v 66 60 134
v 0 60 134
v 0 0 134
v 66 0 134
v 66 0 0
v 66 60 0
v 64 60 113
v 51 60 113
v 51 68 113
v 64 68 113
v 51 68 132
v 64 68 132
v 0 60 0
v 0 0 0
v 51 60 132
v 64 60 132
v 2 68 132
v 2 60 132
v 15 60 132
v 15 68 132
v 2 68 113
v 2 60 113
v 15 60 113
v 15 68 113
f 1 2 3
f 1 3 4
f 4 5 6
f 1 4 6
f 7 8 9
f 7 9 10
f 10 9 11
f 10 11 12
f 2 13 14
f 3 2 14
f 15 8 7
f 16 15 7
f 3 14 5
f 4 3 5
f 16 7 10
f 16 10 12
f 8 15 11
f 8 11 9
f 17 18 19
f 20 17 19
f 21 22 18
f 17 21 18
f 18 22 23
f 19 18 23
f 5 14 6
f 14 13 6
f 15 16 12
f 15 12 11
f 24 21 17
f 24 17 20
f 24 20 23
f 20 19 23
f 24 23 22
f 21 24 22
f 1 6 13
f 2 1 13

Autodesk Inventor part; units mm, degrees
ref_plane "YZ Plane" through (0, 0, 0) normal (1, 0, 0) x (0, 1, 0)
ref_plane "XZ Plane" through (0, 0, 0) normal (0, 1, 0) x (-1, 0, 0)
ref_plane "XY Plane" through (0, 0, 0) normal (0, 0, 1) x (1, 0, 0)
sketch "Sketch1" plane through (0, 0, 0) normal (0, 0, 1) x (1, 0, 0)
  line L0 (0, 0) -> (66, 0)
  line L1 (66, 0) -> (66, 60)
  line L2 (66, 60) -> (0, 60)
  line L3 (0, 60) -> (0, 0)
  dimension "BatteryHeight" = 60
  dimension "BatteryWidth" = 66
extrude "Extrusion1" add sketch "Sketch1" along normal blind 134
sketch "Sketch2" plane through (0, 60, 0) normal (0, 1, 0) x (1, 0, 0)
  line L0 (2, -132) -> (15, -132)
  line L1 (15, -132) -> (15, -113)
  line L2 (15, -113) -> (2, -113)
  line L3 (2, -113) -> (2, -132)
  line L4 (0, -134) -> (66, -134) projected
  line L5 (0, 0) -> (0, -134) projected
  dimension "d6" = 2
  dimension "d7" = 19
  dimension "d8" = 13
  dimension "d9" = 2
extrude "Extrusion2" add sketch "Sketch2" along normal blind 8 separate body
sketch "Sketch3" plane through (0, 60, 0) normal (0, 1, 0) x (1, 0, 0)
  line L0 (0, -134) -> (66, -134) projected
  line L1 (66, 0) -> (66, -134) projected
  line L2 (64, -132) -> (51, -132)
  line L3 (51, -132) -> (51, -113)
  line L4 (51, -113) -> (64, -113)
  line L5 (64, -113) -> (64, -132)
  dimension "d10" = 19
  dimension "d11" = 13
  dimension "d12" = 2
  dimension "d13" = 2
extrude "Extrusion3" add sketch "Sketch3" along normal blind 8 separate body
sketch "Sketch4" plane through (66, 0, 0) normal (1, 0, 0) x (0, 0, -1)
  line L0 (-134, 60) -> (-134, 0) projected
  line L1 (0, 0) -> (-134, 0) projected
  line L2 (0, 0) -> (0, 60) projected
  line L3 (0, 60) -> (-134, 60) projected
  line L4 (-67, 60) -> (-67, 0)
sketch "Sketch5" plane through (0, 0, 0) normal (-1, 0, 0) x (0, 0, 1)
  line L0 (134, 0) -> (134, 60) projected
  line L1 (0, 60) -> (134, 60) projected
  line L2 (0, 60) -> (0, 0) projected
  line L3 (0, 0) -> (134, 0) projected
  line L4 (67, 60) -> (67, 0)
properties part number "TB1272-Battery" material "Lead"
